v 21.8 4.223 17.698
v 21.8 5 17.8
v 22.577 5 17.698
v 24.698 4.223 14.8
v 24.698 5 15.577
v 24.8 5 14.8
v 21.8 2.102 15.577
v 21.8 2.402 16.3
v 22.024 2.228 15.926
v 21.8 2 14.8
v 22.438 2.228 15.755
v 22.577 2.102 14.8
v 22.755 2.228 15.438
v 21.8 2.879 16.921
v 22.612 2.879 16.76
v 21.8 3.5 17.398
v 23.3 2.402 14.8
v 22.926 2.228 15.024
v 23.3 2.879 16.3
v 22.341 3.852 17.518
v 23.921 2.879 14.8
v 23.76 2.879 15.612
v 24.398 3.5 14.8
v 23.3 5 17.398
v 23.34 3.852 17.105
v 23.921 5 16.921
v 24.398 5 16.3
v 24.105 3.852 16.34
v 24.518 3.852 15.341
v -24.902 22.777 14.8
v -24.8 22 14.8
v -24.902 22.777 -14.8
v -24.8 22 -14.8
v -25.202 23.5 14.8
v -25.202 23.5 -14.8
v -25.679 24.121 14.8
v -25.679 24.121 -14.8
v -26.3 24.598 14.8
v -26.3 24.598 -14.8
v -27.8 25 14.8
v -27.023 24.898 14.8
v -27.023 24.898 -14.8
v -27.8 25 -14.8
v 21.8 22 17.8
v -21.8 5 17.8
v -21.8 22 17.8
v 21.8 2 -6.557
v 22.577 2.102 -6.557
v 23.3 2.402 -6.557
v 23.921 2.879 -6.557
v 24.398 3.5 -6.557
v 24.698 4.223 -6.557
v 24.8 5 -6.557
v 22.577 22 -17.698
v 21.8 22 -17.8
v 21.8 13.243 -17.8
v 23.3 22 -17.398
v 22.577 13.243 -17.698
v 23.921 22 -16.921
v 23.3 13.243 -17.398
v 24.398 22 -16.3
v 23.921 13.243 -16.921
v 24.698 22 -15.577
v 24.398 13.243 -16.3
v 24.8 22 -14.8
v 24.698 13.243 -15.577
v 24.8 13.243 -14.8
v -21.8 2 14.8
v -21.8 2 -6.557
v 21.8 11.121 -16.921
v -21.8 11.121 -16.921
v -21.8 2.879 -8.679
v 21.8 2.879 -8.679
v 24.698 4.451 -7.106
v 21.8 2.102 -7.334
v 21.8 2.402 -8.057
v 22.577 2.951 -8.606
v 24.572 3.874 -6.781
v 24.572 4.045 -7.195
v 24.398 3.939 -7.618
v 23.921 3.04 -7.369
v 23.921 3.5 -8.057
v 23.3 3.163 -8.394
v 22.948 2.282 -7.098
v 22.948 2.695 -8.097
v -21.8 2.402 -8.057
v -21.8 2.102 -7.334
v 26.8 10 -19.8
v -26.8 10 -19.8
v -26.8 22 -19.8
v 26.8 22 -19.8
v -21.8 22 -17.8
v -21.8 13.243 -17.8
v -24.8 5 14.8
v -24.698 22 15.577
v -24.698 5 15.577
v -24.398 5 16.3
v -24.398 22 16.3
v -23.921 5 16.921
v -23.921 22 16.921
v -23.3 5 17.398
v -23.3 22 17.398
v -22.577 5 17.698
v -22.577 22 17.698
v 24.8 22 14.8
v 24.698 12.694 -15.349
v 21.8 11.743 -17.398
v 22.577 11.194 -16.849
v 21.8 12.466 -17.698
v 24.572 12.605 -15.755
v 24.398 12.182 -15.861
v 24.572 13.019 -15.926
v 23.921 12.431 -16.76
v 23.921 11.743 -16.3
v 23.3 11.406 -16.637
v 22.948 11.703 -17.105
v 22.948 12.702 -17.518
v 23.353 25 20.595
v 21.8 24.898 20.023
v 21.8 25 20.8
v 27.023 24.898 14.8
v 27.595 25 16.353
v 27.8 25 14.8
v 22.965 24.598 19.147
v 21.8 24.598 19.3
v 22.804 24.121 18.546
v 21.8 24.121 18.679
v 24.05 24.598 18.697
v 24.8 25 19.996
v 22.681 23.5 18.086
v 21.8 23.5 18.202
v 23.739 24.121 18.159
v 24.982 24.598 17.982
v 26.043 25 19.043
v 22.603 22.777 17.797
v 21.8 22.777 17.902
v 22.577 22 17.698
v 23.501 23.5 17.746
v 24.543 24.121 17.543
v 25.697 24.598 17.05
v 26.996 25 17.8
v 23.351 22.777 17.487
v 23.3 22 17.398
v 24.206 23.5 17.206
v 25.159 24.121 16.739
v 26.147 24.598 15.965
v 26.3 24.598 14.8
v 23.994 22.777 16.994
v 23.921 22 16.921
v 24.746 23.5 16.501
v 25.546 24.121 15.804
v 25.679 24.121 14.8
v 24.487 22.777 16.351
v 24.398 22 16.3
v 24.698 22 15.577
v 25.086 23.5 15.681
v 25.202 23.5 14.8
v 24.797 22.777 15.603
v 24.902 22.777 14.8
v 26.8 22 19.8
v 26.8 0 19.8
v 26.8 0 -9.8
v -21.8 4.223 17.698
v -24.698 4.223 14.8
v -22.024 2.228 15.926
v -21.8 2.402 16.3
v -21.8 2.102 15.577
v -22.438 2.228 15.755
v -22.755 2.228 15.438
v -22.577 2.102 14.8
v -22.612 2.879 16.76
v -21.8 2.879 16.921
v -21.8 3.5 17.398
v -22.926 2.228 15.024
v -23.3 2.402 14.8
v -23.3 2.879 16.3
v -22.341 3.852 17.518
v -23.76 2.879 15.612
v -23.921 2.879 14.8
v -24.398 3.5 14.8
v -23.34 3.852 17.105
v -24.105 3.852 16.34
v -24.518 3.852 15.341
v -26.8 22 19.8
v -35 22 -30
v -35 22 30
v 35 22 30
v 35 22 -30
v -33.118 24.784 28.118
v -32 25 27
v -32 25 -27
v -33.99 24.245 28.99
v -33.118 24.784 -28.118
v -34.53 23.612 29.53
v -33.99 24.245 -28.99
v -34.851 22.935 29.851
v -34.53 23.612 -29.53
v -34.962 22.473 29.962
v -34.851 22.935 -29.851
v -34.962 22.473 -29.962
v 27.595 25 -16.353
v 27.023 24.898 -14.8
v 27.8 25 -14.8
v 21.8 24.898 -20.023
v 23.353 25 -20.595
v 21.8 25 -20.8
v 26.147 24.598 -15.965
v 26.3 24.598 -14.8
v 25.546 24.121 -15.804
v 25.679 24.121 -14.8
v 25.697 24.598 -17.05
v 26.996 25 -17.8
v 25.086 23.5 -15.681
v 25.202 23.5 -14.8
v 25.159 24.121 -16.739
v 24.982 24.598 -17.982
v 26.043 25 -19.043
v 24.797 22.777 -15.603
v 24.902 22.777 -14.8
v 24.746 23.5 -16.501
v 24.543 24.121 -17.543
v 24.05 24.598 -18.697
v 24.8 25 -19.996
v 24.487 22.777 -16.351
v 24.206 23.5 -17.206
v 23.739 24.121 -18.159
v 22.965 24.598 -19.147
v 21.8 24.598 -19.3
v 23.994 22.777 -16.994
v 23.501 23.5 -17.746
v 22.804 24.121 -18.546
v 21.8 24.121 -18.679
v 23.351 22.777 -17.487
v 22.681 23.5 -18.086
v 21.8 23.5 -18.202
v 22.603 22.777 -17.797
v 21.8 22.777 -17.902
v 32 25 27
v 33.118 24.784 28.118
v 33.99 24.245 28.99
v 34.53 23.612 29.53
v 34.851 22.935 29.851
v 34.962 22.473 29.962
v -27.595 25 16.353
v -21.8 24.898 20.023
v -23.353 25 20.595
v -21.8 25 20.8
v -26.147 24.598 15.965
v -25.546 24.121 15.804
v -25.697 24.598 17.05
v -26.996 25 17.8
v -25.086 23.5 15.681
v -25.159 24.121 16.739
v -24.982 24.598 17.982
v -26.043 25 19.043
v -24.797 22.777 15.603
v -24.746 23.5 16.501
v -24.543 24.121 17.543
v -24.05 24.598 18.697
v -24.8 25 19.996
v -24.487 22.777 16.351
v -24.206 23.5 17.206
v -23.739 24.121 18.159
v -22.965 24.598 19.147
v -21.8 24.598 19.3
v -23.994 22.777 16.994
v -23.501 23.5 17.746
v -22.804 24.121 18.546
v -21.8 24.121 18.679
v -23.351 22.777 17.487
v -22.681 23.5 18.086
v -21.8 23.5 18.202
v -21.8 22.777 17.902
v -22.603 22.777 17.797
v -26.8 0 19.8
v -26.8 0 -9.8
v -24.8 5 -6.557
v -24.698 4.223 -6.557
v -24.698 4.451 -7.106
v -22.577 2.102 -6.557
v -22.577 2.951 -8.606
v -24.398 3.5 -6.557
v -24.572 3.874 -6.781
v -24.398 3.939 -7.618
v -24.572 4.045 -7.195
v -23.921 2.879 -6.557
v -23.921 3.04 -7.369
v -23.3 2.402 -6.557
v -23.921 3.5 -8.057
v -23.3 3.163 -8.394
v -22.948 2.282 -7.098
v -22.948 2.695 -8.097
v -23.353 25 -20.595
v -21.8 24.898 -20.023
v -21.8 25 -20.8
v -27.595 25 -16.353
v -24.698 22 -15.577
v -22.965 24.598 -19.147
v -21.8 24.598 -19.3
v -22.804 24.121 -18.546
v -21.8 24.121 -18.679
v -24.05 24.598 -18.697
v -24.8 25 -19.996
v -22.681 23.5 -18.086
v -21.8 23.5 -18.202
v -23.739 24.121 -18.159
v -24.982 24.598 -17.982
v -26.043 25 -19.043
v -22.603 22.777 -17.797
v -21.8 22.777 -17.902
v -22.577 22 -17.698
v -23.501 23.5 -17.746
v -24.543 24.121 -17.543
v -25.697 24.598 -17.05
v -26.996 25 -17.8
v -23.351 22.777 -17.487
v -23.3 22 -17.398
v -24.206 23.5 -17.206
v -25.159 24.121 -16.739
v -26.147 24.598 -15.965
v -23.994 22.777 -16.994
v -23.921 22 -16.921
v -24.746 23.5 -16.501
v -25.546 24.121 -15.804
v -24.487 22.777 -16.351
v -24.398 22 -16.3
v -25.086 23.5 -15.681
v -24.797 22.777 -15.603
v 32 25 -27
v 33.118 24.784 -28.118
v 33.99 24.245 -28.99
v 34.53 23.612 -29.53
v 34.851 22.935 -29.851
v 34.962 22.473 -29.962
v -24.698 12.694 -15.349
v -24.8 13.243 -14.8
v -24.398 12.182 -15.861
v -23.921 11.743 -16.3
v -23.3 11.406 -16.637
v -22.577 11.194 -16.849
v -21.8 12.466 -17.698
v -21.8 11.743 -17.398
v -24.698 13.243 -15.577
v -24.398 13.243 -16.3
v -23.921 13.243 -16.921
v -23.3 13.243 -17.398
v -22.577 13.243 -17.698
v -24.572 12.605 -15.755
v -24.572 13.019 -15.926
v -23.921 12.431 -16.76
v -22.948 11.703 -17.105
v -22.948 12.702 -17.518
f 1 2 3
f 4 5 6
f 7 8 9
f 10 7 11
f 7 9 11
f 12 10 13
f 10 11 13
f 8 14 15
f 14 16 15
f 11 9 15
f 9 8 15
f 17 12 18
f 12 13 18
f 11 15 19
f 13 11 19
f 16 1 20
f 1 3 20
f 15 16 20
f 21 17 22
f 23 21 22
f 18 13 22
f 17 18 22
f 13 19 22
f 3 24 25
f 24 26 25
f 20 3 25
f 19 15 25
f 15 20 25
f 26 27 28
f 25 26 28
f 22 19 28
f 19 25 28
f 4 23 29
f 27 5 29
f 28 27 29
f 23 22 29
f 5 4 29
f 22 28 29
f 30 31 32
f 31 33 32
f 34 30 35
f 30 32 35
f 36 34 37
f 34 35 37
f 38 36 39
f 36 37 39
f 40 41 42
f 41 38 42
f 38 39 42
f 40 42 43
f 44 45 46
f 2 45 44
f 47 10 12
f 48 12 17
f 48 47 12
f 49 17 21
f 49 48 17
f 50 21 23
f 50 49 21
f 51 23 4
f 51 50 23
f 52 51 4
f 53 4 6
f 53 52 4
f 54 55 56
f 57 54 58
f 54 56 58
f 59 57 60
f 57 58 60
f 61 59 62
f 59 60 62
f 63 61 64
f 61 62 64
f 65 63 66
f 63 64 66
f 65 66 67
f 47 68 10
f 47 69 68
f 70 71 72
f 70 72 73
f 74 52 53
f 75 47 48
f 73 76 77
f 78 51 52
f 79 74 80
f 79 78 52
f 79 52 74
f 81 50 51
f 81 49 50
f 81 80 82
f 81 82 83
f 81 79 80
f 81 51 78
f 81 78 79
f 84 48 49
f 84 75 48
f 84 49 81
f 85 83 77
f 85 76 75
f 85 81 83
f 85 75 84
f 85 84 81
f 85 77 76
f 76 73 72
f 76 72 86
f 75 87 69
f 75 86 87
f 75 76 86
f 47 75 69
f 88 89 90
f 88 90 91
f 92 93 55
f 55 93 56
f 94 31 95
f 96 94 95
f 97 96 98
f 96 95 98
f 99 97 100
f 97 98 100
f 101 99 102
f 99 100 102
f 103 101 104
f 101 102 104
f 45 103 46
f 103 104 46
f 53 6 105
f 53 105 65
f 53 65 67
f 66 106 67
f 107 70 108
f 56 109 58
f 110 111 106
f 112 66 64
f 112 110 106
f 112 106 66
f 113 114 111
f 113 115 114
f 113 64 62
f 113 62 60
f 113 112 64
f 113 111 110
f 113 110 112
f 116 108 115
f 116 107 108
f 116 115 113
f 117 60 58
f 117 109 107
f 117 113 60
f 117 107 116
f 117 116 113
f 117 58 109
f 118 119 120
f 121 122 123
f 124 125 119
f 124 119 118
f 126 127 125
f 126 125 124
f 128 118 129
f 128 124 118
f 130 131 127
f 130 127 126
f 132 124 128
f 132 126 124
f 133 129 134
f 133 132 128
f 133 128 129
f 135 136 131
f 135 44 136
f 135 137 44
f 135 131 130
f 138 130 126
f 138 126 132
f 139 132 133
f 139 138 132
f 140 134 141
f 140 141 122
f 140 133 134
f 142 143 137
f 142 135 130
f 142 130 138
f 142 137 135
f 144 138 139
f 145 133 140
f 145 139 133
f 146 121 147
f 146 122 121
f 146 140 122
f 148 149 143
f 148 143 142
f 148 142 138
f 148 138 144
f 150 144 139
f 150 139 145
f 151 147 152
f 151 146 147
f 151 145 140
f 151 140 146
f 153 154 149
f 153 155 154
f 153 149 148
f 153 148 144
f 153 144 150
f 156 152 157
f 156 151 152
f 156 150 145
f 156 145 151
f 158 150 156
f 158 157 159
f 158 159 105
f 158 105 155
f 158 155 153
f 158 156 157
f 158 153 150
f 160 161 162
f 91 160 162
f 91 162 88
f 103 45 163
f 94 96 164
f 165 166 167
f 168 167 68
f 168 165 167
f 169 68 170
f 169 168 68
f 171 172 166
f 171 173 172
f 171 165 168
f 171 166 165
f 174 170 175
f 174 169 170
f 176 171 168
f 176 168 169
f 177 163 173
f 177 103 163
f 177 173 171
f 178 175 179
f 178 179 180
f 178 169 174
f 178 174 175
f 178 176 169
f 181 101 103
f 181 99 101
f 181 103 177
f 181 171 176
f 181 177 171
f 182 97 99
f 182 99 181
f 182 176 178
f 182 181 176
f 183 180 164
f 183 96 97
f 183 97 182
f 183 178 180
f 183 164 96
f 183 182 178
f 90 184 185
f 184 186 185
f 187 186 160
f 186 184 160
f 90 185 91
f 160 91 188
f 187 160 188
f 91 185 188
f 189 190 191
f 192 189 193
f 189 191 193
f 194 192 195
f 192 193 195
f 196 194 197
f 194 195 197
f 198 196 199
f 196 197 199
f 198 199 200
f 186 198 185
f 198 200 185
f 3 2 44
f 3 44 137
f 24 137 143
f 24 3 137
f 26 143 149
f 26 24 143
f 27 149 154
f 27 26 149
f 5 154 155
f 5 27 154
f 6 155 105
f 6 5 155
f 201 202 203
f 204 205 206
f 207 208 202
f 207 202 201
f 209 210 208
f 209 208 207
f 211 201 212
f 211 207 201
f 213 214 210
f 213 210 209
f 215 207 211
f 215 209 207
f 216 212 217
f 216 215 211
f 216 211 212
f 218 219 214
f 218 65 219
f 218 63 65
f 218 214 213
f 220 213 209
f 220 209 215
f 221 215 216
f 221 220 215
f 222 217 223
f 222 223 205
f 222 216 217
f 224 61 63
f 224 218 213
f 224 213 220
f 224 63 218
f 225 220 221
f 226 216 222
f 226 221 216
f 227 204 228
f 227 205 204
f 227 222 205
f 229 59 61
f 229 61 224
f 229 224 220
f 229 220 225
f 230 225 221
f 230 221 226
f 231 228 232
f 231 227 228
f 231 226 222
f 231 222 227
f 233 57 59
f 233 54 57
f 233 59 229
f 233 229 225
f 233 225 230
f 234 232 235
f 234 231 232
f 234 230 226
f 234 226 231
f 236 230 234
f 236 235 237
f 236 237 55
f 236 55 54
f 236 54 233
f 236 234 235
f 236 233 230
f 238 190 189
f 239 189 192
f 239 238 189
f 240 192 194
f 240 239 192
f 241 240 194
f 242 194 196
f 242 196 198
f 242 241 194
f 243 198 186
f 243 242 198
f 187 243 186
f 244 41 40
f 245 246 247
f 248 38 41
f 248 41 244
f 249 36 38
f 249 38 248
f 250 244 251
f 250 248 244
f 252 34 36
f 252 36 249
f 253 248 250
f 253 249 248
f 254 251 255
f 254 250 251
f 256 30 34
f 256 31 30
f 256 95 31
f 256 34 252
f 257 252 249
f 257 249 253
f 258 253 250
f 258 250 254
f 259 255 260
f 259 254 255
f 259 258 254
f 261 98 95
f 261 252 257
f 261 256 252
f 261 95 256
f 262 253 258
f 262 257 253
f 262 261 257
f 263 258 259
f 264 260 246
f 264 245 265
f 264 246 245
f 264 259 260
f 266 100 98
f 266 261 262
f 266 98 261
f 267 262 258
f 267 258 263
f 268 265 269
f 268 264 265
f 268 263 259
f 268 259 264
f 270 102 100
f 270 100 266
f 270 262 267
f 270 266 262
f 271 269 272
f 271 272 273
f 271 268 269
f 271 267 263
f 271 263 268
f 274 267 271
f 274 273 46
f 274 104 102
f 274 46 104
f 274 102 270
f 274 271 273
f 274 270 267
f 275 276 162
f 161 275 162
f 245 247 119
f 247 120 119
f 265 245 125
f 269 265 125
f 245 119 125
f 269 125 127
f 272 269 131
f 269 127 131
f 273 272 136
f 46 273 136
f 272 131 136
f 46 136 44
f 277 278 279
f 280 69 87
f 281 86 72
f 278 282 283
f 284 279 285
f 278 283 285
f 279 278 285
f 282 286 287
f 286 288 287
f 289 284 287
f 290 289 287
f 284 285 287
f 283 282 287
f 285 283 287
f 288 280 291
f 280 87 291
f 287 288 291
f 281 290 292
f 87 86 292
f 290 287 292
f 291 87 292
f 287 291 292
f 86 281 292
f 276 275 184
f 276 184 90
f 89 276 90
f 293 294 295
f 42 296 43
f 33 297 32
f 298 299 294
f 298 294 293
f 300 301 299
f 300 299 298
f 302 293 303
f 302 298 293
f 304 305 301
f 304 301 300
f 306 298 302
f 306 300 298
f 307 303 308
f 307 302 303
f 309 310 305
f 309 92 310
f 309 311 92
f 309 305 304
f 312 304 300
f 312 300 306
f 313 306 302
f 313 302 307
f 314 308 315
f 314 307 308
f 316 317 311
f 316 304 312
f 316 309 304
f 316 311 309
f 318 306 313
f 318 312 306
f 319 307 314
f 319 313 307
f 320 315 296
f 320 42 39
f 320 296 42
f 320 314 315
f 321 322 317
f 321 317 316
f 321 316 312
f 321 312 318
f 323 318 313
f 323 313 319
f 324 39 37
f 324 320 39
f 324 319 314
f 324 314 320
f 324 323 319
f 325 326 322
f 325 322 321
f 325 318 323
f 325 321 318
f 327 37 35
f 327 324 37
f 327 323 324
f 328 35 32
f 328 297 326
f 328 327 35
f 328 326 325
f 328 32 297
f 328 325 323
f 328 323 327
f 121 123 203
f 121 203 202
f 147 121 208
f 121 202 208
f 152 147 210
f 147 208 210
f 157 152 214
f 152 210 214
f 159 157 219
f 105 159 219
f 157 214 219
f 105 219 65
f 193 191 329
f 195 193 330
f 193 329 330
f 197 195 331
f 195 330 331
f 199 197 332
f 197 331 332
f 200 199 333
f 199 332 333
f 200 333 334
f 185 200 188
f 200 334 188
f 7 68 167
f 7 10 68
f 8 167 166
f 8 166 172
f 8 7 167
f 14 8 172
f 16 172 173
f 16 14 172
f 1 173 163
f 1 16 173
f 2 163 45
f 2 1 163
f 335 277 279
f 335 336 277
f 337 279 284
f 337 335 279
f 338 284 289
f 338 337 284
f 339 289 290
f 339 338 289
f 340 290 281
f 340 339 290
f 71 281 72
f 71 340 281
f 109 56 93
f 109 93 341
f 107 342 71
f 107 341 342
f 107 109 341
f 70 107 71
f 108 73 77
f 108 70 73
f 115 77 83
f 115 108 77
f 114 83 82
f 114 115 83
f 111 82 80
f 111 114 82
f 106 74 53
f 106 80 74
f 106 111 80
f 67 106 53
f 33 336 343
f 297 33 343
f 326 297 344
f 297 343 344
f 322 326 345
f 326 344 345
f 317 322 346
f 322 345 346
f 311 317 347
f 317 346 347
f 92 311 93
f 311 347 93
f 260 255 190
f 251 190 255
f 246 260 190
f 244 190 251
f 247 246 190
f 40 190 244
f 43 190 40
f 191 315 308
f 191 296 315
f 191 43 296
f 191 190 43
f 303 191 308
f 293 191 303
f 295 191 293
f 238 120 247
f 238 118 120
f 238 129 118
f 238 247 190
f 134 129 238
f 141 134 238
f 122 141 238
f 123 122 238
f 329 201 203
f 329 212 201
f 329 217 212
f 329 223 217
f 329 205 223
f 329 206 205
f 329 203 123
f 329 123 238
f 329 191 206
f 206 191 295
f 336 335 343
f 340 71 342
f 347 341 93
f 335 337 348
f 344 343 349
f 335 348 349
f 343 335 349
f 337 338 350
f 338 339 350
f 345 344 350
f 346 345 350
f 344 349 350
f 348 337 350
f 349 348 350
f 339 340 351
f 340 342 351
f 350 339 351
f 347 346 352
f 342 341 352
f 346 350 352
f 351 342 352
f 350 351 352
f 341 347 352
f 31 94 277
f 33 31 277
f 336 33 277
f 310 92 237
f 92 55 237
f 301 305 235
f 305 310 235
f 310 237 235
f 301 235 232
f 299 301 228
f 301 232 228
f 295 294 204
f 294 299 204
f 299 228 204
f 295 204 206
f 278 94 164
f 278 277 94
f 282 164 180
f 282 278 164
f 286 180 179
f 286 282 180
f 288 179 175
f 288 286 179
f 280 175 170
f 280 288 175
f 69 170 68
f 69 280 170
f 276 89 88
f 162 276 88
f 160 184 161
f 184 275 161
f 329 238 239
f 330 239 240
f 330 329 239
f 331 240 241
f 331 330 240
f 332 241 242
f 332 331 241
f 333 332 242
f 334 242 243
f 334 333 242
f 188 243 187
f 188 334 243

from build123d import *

# Parameters (mm, degrees)
SKETCH1_W           = 53.6
SKETCH1_H           = 39.6
BOSS_EXTRUDE1_DEPTH = 2
SKETCH2_W           = 53.6
SKETCH2_H           = 39.6
SKETCH2_W_2         = 49.6
SKETCH2_H_2         = 35.6
BOSS_EXTRUDE2_DEPTH = 20
SKETCH3_W           = 70
SKETCH3_H           = 60
SKETCH3_W_2         = 49.6
SKETCH3_H_2         = 35.6
BOSS_EXTRUDE3_DEPTH = 3
CHAMFER1_SIZE       = 10
FILLET1_R           = 3


with BuildPart() as part:
    # Sketch1 → Boss-Extrude1 (new body)
    with BuildSketch(Plane(origin=(0, 0, 0), x_dir=(1, 0, 0), z_dir=(0, 1, 0))):
        Rectangle(SKETCH1_W, SKETCH1_H)
    extrude(amount=BOSS_EXTRUDE1_DEPTH)

    # Sketch2 → Boss-Extrude2 (add)
    with BuildSketch(Plane(origin=(0, 2, 0), x_dir=(1, 0, 0), z_dir=(0, 1, 0))):
        Rectangle(SKETCH2_W, SKETCH2_H)
        Rectangle(SKETCH2_W_2, SKETCH2_H_2, mode=Mode.SUBTRACT)
    extrude(amount=BOSS_EXTRUDE2_DEPTH)

    # Sketch3 → Boss-Extrude3 (add)
    with BuildSketch(Plane(origin=(0, 22, 0), x_dir=(1, 0, 0), z_dir=(0, 1, 0))):
        Rectangle(SKETCH3_W, SKETCH3_H)
        Rectangle(SKETCH3_W_2, SKETCH3_H_2, mode=Mode.SUBTRACT)
    extrude(amount=BOSS_EXTRUDE3_DEPTH)

    # Chamfer1
    chamfer1_edges = [part.edges().sort_by_distance(p)[0] for p in [
        (0, 2, -17.8),
        (0, 0, -19.8),
    ]]
    chamfer(chamfer1_edges, length=CHAMFER1_SIZE)

    # Fillet1
    fillet1_edges = [part.edges().sort_by_distance(p)[0] for p in [
        (24.8, 13.5, 17.8),
        (0, 25, 17.8),
        (-24.8, 13.5, 17.8),
        (0, 2, 17.8),
        (24.8, 18.5, -17.8),
        (-24.8, 18.5, -17.8),
        (24.8, 2, 5),
        (-24.8, 2, 5),
        (24.8, 25, 0),
        (0, 25, -17.8),
        (-24.8, 25, 0),
        (0, 25, 30),
        (0, 25, -30),
        (35, 25, 0),
        (-35, 25, 0),
        (0, 12, -17.8),
        (24.8, 7, -12.8),
        (-24.8, 7, -12.8),
        (0, 2, -7.8),
    ]]
    fillet(fillet1_edges, radius=FILLET1_R - 0.0001)  # a hair under: the kernel refuses the full size


solid = part.part
